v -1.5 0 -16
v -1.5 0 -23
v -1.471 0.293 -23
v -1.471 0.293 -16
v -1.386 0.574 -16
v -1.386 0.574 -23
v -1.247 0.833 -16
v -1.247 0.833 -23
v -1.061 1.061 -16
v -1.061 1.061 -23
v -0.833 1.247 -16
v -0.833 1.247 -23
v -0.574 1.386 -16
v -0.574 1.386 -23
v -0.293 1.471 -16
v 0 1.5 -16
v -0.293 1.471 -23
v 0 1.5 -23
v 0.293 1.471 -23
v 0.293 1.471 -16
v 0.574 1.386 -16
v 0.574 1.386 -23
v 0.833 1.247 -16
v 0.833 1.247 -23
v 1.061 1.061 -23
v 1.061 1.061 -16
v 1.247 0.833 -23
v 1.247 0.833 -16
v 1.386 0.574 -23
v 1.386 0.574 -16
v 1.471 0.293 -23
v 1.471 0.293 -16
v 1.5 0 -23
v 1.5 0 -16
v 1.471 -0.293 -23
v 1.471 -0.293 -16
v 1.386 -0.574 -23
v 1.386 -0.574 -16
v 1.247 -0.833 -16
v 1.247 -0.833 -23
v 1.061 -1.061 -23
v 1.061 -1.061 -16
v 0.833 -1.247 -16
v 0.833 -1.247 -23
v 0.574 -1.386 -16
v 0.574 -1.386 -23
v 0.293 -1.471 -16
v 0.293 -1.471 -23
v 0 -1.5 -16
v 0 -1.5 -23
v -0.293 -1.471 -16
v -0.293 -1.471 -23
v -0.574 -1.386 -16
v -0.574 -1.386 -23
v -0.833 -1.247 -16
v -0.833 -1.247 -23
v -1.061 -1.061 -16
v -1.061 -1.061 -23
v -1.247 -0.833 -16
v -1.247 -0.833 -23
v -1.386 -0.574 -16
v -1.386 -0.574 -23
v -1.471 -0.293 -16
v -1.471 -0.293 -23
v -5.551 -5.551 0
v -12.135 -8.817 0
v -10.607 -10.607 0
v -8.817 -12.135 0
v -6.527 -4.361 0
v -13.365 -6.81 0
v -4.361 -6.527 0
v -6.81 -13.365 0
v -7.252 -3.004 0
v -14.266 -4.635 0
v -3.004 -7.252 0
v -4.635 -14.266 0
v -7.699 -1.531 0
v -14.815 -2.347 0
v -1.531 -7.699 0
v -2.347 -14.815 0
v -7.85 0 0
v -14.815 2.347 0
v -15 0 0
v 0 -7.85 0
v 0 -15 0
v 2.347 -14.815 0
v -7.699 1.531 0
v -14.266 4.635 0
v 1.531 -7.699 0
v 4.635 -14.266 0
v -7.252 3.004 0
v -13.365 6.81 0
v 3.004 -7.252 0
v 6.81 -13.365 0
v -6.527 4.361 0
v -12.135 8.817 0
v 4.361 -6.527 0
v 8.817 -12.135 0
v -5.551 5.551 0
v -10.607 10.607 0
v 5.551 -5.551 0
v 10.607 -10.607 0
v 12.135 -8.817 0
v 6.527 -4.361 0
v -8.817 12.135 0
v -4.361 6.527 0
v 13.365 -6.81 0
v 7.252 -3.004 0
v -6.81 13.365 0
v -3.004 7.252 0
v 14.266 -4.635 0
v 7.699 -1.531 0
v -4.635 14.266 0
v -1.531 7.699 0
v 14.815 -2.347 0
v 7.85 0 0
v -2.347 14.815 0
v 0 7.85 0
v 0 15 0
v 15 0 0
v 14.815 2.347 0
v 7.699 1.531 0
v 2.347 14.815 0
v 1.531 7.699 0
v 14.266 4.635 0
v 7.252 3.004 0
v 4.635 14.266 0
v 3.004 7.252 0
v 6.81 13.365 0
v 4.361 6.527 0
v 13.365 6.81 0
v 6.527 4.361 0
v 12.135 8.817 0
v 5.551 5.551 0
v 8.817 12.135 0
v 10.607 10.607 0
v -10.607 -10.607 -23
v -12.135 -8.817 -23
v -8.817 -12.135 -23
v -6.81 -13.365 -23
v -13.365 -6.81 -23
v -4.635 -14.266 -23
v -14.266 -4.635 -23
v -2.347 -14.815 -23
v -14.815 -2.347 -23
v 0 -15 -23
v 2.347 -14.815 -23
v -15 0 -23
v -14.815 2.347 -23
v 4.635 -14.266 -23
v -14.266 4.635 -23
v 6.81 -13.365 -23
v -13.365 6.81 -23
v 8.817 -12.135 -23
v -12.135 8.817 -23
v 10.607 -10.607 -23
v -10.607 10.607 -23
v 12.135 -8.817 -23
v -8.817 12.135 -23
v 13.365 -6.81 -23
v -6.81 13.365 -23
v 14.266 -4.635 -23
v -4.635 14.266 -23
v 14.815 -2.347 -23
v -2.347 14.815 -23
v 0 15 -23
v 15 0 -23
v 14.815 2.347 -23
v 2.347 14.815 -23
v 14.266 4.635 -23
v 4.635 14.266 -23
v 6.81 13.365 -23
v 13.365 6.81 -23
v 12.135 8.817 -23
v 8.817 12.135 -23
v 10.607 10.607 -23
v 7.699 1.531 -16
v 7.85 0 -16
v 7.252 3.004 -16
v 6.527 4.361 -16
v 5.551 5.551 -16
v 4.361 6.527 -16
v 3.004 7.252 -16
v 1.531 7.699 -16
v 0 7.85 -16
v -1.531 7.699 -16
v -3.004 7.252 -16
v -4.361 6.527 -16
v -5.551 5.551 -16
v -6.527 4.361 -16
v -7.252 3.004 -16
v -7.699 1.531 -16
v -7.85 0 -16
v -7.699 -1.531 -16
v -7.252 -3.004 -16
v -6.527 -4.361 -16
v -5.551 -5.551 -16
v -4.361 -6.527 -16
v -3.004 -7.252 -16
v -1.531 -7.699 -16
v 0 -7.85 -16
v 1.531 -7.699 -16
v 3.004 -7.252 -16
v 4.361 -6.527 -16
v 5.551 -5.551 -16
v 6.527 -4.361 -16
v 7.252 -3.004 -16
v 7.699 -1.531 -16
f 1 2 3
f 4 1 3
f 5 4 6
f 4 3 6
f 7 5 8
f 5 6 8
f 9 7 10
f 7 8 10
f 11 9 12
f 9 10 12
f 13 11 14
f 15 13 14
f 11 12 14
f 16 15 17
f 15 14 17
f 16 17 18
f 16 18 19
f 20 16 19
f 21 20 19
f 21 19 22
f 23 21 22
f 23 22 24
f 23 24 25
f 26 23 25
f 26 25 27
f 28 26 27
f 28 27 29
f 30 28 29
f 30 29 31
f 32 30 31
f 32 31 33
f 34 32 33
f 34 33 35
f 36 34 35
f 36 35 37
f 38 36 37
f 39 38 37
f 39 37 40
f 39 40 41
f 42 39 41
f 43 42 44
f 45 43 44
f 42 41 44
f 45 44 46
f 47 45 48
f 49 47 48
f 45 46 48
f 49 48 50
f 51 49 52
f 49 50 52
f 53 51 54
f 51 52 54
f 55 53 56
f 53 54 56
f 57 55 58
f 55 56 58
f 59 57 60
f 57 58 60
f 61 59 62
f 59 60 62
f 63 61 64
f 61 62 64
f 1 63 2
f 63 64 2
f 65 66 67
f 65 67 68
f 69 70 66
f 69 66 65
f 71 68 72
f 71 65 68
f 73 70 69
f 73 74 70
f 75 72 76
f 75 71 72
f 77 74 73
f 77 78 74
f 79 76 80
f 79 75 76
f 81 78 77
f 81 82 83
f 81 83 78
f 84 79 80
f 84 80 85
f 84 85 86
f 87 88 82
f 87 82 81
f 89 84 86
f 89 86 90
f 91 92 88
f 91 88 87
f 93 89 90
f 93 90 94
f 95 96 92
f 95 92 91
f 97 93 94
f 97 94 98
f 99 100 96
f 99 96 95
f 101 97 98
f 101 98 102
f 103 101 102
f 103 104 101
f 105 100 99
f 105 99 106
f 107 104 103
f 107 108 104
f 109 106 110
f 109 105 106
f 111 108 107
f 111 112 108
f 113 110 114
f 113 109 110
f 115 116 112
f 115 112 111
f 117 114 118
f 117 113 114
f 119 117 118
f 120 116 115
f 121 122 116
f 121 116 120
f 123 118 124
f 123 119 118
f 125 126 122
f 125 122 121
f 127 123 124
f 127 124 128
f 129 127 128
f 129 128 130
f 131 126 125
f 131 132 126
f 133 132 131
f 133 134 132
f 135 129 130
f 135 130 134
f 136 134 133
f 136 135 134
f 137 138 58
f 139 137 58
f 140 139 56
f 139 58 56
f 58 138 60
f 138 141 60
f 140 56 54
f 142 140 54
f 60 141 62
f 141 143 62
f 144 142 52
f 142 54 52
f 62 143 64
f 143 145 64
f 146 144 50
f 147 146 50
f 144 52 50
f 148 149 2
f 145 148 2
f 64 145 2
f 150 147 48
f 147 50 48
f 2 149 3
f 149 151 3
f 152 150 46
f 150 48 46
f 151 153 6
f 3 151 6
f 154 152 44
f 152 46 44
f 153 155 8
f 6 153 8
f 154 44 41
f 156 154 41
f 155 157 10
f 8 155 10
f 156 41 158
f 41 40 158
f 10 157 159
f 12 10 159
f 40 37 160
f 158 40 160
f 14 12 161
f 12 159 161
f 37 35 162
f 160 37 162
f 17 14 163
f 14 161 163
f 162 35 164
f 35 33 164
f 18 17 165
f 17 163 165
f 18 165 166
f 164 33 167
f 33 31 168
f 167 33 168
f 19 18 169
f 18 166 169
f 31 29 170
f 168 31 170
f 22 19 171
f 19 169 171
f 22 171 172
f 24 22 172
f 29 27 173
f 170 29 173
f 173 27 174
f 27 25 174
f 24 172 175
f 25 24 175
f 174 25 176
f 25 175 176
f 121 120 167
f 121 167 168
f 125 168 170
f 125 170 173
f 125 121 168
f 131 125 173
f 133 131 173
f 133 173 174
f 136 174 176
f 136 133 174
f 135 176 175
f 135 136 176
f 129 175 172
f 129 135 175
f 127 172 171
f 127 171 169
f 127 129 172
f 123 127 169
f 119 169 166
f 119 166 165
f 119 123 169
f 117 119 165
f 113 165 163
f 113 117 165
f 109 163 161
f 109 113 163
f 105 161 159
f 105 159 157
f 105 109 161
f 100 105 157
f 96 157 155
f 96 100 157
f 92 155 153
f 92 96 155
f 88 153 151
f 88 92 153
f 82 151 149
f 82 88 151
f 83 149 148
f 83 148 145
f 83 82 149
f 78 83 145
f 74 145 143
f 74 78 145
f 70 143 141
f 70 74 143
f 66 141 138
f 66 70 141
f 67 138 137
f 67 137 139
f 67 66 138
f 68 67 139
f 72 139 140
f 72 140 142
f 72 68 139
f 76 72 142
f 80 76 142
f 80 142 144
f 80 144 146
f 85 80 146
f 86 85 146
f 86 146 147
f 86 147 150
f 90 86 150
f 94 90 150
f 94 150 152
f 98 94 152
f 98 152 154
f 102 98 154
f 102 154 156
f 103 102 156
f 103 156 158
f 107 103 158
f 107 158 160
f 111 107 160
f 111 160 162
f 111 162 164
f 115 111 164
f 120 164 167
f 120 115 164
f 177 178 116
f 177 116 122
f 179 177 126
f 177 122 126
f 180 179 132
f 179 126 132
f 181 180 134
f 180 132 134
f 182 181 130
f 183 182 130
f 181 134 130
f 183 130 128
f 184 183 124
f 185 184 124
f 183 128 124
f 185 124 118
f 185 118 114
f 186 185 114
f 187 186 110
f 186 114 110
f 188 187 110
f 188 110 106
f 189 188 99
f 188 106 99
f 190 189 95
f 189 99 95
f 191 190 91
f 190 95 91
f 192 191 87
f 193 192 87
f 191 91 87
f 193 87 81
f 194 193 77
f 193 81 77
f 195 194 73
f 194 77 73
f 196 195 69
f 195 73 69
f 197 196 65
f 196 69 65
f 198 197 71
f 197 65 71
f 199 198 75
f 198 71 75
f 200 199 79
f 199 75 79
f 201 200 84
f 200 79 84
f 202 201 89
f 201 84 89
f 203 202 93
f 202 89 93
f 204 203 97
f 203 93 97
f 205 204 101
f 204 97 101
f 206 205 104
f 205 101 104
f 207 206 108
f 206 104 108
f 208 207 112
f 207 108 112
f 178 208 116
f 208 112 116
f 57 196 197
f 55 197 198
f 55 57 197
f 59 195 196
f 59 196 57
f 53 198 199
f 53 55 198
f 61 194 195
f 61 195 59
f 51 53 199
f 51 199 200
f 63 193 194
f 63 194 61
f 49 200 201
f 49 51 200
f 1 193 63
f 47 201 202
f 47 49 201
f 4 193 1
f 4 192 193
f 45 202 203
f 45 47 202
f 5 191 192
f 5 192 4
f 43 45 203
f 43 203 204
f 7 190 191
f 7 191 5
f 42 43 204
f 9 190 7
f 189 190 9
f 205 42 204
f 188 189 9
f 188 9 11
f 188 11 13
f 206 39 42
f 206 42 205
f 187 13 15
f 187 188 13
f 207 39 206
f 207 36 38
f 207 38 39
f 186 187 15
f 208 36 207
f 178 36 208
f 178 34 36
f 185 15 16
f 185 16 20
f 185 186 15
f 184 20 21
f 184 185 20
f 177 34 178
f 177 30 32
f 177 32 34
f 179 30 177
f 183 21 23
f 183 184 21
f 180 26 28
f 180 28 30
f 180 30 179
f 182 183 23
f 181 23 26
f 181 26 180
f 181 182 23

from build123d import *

# Parameters (mm, degrees)
CROQUIS1_R              = 15
SALIENTE_EXTRUIR1_DEPTH = 23
CROQUIS2_R              = 7.85
CORTAR_EXTRUIR1_DEPTH   = 16
CROQUIS3_R              = 1.5
CORTAR_EXTRUIR2_DEPTH   = 16


with BuildPart() as part:
    # Croquis1 → Saliente-Extruir1 (new body)
    with BuildSketch(Plane.XY):
        Circle(CROQUIS1_R)
    extrude(amount=-SALIENTE_EXTRUIR1_DEPTH)

    # Croquis2 → Cortar-Extruir1 (cut)
    with BuildSketch(Plane.XY):
        Circle(CROQUIS2_R)
    extrude(amount=-CORTAR_EXTRUIR1_DEPTH, mode=Mode.SUBTRACT)

    # Croquis3 → Cortar-Extruir2 (cut)
    with BuildSketch(Plane(origin=(0, 0, -23), x_dir=(-1, 0, 0), z_dir=(0, 0, -1))):
        Circle(CROQUIS3_R)
    extrude(amount=-CORTAR_EXTRUIR2_DEPTH, mode=Mode.SUBTRACT)


solid = part.part
